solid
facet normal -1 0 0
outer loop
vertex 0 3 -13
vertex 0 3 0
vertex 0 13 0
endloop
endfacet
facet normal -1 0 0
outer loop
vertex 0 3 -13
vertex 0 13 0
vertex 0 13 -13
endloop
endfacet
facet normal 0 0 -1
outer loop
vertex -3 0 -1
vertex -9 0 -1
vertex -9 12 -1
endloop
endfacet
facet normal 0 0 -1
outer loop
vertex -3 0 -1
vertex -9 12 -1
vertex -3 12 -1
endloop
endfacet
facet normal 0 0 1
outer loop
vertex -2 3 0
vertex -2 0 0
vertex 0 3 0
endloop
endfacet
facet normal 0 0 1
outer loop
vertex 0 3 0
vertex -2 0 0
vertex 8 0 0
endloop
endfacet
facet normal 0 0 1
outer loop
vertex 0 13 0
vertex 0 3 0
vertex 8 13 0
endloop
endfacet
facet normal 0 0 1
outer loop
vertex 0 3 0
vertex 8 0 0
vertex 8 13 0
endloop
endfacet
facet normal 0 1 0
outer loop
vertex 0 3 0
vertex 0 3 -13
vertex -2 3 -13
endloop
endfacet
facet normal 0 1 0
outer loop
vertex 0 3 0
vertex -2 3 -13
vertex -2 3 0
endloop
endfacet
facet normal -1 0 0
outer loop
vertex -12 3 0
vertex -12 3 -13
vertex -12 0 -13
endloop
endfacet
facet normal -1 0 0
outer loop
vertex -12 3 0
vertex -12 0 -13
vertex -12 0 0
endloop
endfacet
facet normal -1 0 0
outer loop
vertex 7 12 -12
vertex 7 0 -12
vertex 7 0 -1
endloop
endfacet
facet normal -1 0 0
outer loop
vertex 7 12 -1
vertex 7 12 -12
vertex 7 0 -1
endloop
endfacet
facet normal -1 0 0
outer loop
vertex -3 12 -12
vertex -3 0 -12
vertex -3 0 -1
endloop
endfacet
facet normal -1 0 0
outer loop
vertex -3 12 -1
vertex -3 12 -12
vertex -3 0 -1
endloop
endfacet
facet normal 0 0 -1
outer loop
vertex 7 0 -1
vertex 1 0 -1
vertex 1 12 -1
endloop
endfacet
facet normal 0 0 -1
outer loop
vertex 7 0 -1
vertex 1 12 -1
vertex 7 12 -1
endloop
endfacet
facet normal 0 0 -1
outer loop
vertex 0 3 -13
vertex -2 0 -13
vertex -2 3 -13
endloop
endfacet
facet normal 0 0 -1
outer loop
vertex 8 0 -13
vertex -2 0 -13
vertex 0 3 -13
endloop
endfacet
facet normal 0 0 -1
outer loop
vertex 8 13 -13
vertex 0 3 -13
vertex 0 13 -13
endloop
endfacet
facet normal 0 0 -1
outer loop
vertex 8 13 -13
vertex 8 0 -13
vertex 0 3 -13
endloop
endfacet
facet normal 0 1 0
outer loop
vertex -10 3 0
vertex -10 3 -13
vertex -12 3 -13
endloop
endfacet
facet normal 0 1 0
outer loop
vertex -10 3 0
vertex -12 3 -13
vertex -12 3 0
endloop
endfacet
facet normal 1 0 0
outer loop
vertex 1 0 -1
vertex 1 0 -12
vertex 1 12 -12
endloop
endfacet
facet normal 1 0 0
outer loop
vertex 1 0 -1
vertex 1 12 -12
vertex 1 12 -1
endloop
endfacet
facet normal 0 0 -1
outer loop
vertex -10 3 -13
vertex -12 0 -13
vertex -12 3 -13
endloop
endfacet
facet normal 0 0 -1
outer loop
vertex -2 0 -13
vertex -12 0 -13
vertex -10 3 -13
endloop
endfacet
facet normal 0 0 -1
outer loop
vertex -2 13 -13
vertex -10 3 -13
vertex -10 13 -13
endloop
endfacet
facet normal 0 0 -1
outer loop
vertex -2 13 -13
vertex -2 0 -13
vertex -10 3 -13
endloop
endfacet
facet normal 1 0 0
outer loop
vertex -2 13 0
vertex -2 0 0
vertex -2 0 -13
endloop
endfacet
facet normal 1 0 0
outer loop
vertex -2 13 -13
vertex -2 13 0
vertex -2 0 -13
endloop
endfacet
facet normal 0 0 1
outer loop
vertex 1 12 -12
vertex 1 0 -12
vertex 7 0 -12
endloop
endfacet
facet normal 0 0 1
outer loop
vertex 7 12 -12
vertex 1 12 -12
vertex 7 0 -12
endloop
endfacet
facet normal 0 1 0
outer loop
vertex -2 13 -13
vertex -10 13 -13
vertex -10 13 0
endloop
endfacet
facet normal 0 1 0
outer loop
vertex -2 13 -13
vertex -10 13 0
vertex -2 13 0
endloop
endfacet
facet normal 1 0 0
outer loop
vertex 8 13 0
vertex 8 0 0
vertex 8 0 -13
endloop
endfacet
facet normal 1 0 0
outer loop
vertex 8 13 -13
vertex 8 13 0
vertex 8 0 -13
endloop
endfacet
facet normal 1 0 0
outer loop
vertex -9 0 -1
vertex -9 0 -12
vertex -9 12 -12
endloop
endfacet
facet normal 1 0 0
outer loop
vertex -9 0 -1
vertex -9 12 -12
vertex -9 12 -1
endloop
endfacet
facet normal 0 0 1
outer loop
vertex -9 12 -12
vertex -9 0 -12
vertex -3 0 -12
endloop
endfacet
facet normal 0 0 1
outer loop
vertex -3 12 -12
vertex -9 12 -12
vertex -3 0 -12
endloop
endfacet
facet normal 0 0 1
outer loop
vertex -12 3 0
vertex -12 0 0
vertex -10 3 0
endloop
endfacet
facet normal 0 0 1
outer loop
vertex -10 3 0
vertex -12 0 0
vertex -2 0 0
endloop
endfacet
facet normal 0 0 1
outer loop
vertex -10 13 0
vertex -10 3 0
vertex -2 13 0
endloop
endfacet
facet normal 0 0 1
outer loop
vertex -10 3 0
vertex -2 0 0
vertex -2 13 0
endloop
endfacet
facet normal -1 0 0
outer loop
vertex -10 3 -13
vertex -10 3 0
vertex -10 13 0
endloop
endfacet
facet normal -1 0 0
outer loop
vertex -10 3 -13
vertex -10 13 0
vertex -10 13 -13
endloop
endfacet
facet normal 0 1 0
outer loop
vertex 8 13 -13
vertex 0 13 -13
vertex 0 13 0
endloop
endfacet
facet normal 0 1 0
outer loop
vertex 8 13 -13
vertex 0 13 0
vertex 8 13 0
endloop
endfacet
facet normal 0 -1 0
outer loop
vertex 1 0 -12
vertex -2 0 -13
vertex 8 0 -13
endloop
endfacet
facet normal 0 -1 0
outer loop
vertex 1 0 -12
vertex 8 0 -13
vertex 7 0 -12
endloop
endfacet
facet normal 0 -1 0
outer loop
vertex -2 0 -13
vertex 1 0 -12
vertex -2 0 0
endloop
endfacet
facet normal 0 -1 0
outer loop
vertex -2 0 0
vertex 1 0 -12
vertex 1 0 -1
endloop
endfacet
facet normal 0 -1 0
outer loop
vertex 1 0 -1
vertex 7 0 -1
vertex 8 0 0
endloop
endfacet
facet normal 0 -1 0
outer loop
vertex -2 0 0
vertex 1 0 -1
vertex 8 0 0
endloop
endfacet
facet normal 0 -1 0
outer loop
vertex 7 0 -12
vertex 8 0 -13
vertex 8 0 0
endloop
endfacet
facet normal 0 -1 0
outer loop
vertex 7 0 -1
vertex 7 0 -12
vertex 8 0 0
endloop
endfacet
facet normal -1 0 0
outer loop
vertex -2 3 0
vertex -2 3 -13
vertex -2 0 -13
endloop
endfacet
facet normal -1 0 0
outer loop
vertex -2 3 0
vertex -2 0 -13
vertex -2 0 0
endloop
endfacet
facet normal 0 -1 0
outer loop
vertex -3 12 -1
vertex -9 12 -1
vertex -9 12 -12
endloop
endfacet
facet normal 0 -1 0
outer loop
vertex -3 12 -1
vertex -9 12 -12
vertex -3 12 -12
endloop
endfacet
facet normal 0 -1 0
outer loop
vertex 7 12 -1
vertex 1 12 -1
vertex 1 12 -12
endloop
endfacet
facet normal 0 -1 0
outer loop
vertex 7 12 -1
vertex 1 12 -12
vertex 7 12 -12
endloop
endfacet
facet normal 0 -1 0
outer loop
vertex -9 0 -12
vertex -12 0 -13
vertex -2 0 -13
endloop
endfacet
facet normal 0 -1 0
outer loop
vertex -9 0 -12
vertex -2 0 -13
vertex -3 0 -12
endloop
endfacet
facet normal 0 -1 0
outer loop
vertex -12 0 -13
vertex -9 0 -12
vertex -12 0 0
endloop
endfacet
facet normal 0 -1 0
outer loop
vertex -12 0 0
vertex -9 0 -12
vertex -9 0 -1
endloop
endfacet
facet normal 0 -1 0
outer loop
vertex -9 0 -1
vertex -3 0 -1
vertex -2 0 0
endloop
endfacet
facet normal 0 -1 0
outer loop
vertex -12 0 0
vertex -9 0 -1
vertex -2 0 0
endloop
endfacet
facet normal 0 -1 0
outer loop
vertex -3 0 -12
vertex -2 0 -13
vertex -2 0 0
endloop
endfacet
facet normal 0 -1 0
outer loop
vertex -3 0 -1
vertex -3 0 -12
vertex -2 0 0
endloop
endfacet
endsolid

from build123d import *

# Parameters (mm, degrees)
SKETCH1_W           = 8
SKETCH1_H           = 13
BOSS_EXTRUDE1_DEPTH = 13
SKETCH2_W           = 6
SKETCH2_H           = 11
CUT_EXTRUDE1_DEPTH  = 12
SKETCH3_W           = 13
SKETCH3_H           = 3
BOSS_EXTRUDE2_DEPTH = 2
LPATTERN1_COUNT     = 2
LPATTERN1_PITCH     = 10


with BuildPart() as part:
    # Sketch1 → Boss-Extrude1 (new body)
    with BuildSketch(Plane(origin=(0, 0, 0), x_dir=(1, 0, 0), z_dir=(0, 1, 0))):
        with Locations((4, 6.5)):
            Rectangle(SKETCH1_W, SKETCH1_H)
    extrude(amount=BOSS_EXTRUDE1_DEPTH)

    # Sketch2 → Cut-Extrude1 (cut)
    with BuildSketch(Plane.XZ):
        with Locations((4, -6.5)):
            Rectangle(SKETCH2_W, SKETCH2_H)
    extrude(amount=-CUT_EXTRUDE1_DEPTH, mode=Mode.SUBTRACT)

    # Sketch3 → Boss-Extrude2 (add)
    with BuildSketch(Plane.ZY):
        with Locations((-6.5, 1.5)):
            Rectangle(SKETCH3_W, SKETCH3_H)
    extrude(amount=BOSS_EXTRUDE2_DEPTH)


with BuildPart() as lpattern1_1:
    # LPattern1: pattern copy
    add(part.part.moved(Location(Vector(-1, 0, 0) * (1 * LPATTERN1_PITCH))))


solid = Compound([part.part, lpattern1_1.part])
